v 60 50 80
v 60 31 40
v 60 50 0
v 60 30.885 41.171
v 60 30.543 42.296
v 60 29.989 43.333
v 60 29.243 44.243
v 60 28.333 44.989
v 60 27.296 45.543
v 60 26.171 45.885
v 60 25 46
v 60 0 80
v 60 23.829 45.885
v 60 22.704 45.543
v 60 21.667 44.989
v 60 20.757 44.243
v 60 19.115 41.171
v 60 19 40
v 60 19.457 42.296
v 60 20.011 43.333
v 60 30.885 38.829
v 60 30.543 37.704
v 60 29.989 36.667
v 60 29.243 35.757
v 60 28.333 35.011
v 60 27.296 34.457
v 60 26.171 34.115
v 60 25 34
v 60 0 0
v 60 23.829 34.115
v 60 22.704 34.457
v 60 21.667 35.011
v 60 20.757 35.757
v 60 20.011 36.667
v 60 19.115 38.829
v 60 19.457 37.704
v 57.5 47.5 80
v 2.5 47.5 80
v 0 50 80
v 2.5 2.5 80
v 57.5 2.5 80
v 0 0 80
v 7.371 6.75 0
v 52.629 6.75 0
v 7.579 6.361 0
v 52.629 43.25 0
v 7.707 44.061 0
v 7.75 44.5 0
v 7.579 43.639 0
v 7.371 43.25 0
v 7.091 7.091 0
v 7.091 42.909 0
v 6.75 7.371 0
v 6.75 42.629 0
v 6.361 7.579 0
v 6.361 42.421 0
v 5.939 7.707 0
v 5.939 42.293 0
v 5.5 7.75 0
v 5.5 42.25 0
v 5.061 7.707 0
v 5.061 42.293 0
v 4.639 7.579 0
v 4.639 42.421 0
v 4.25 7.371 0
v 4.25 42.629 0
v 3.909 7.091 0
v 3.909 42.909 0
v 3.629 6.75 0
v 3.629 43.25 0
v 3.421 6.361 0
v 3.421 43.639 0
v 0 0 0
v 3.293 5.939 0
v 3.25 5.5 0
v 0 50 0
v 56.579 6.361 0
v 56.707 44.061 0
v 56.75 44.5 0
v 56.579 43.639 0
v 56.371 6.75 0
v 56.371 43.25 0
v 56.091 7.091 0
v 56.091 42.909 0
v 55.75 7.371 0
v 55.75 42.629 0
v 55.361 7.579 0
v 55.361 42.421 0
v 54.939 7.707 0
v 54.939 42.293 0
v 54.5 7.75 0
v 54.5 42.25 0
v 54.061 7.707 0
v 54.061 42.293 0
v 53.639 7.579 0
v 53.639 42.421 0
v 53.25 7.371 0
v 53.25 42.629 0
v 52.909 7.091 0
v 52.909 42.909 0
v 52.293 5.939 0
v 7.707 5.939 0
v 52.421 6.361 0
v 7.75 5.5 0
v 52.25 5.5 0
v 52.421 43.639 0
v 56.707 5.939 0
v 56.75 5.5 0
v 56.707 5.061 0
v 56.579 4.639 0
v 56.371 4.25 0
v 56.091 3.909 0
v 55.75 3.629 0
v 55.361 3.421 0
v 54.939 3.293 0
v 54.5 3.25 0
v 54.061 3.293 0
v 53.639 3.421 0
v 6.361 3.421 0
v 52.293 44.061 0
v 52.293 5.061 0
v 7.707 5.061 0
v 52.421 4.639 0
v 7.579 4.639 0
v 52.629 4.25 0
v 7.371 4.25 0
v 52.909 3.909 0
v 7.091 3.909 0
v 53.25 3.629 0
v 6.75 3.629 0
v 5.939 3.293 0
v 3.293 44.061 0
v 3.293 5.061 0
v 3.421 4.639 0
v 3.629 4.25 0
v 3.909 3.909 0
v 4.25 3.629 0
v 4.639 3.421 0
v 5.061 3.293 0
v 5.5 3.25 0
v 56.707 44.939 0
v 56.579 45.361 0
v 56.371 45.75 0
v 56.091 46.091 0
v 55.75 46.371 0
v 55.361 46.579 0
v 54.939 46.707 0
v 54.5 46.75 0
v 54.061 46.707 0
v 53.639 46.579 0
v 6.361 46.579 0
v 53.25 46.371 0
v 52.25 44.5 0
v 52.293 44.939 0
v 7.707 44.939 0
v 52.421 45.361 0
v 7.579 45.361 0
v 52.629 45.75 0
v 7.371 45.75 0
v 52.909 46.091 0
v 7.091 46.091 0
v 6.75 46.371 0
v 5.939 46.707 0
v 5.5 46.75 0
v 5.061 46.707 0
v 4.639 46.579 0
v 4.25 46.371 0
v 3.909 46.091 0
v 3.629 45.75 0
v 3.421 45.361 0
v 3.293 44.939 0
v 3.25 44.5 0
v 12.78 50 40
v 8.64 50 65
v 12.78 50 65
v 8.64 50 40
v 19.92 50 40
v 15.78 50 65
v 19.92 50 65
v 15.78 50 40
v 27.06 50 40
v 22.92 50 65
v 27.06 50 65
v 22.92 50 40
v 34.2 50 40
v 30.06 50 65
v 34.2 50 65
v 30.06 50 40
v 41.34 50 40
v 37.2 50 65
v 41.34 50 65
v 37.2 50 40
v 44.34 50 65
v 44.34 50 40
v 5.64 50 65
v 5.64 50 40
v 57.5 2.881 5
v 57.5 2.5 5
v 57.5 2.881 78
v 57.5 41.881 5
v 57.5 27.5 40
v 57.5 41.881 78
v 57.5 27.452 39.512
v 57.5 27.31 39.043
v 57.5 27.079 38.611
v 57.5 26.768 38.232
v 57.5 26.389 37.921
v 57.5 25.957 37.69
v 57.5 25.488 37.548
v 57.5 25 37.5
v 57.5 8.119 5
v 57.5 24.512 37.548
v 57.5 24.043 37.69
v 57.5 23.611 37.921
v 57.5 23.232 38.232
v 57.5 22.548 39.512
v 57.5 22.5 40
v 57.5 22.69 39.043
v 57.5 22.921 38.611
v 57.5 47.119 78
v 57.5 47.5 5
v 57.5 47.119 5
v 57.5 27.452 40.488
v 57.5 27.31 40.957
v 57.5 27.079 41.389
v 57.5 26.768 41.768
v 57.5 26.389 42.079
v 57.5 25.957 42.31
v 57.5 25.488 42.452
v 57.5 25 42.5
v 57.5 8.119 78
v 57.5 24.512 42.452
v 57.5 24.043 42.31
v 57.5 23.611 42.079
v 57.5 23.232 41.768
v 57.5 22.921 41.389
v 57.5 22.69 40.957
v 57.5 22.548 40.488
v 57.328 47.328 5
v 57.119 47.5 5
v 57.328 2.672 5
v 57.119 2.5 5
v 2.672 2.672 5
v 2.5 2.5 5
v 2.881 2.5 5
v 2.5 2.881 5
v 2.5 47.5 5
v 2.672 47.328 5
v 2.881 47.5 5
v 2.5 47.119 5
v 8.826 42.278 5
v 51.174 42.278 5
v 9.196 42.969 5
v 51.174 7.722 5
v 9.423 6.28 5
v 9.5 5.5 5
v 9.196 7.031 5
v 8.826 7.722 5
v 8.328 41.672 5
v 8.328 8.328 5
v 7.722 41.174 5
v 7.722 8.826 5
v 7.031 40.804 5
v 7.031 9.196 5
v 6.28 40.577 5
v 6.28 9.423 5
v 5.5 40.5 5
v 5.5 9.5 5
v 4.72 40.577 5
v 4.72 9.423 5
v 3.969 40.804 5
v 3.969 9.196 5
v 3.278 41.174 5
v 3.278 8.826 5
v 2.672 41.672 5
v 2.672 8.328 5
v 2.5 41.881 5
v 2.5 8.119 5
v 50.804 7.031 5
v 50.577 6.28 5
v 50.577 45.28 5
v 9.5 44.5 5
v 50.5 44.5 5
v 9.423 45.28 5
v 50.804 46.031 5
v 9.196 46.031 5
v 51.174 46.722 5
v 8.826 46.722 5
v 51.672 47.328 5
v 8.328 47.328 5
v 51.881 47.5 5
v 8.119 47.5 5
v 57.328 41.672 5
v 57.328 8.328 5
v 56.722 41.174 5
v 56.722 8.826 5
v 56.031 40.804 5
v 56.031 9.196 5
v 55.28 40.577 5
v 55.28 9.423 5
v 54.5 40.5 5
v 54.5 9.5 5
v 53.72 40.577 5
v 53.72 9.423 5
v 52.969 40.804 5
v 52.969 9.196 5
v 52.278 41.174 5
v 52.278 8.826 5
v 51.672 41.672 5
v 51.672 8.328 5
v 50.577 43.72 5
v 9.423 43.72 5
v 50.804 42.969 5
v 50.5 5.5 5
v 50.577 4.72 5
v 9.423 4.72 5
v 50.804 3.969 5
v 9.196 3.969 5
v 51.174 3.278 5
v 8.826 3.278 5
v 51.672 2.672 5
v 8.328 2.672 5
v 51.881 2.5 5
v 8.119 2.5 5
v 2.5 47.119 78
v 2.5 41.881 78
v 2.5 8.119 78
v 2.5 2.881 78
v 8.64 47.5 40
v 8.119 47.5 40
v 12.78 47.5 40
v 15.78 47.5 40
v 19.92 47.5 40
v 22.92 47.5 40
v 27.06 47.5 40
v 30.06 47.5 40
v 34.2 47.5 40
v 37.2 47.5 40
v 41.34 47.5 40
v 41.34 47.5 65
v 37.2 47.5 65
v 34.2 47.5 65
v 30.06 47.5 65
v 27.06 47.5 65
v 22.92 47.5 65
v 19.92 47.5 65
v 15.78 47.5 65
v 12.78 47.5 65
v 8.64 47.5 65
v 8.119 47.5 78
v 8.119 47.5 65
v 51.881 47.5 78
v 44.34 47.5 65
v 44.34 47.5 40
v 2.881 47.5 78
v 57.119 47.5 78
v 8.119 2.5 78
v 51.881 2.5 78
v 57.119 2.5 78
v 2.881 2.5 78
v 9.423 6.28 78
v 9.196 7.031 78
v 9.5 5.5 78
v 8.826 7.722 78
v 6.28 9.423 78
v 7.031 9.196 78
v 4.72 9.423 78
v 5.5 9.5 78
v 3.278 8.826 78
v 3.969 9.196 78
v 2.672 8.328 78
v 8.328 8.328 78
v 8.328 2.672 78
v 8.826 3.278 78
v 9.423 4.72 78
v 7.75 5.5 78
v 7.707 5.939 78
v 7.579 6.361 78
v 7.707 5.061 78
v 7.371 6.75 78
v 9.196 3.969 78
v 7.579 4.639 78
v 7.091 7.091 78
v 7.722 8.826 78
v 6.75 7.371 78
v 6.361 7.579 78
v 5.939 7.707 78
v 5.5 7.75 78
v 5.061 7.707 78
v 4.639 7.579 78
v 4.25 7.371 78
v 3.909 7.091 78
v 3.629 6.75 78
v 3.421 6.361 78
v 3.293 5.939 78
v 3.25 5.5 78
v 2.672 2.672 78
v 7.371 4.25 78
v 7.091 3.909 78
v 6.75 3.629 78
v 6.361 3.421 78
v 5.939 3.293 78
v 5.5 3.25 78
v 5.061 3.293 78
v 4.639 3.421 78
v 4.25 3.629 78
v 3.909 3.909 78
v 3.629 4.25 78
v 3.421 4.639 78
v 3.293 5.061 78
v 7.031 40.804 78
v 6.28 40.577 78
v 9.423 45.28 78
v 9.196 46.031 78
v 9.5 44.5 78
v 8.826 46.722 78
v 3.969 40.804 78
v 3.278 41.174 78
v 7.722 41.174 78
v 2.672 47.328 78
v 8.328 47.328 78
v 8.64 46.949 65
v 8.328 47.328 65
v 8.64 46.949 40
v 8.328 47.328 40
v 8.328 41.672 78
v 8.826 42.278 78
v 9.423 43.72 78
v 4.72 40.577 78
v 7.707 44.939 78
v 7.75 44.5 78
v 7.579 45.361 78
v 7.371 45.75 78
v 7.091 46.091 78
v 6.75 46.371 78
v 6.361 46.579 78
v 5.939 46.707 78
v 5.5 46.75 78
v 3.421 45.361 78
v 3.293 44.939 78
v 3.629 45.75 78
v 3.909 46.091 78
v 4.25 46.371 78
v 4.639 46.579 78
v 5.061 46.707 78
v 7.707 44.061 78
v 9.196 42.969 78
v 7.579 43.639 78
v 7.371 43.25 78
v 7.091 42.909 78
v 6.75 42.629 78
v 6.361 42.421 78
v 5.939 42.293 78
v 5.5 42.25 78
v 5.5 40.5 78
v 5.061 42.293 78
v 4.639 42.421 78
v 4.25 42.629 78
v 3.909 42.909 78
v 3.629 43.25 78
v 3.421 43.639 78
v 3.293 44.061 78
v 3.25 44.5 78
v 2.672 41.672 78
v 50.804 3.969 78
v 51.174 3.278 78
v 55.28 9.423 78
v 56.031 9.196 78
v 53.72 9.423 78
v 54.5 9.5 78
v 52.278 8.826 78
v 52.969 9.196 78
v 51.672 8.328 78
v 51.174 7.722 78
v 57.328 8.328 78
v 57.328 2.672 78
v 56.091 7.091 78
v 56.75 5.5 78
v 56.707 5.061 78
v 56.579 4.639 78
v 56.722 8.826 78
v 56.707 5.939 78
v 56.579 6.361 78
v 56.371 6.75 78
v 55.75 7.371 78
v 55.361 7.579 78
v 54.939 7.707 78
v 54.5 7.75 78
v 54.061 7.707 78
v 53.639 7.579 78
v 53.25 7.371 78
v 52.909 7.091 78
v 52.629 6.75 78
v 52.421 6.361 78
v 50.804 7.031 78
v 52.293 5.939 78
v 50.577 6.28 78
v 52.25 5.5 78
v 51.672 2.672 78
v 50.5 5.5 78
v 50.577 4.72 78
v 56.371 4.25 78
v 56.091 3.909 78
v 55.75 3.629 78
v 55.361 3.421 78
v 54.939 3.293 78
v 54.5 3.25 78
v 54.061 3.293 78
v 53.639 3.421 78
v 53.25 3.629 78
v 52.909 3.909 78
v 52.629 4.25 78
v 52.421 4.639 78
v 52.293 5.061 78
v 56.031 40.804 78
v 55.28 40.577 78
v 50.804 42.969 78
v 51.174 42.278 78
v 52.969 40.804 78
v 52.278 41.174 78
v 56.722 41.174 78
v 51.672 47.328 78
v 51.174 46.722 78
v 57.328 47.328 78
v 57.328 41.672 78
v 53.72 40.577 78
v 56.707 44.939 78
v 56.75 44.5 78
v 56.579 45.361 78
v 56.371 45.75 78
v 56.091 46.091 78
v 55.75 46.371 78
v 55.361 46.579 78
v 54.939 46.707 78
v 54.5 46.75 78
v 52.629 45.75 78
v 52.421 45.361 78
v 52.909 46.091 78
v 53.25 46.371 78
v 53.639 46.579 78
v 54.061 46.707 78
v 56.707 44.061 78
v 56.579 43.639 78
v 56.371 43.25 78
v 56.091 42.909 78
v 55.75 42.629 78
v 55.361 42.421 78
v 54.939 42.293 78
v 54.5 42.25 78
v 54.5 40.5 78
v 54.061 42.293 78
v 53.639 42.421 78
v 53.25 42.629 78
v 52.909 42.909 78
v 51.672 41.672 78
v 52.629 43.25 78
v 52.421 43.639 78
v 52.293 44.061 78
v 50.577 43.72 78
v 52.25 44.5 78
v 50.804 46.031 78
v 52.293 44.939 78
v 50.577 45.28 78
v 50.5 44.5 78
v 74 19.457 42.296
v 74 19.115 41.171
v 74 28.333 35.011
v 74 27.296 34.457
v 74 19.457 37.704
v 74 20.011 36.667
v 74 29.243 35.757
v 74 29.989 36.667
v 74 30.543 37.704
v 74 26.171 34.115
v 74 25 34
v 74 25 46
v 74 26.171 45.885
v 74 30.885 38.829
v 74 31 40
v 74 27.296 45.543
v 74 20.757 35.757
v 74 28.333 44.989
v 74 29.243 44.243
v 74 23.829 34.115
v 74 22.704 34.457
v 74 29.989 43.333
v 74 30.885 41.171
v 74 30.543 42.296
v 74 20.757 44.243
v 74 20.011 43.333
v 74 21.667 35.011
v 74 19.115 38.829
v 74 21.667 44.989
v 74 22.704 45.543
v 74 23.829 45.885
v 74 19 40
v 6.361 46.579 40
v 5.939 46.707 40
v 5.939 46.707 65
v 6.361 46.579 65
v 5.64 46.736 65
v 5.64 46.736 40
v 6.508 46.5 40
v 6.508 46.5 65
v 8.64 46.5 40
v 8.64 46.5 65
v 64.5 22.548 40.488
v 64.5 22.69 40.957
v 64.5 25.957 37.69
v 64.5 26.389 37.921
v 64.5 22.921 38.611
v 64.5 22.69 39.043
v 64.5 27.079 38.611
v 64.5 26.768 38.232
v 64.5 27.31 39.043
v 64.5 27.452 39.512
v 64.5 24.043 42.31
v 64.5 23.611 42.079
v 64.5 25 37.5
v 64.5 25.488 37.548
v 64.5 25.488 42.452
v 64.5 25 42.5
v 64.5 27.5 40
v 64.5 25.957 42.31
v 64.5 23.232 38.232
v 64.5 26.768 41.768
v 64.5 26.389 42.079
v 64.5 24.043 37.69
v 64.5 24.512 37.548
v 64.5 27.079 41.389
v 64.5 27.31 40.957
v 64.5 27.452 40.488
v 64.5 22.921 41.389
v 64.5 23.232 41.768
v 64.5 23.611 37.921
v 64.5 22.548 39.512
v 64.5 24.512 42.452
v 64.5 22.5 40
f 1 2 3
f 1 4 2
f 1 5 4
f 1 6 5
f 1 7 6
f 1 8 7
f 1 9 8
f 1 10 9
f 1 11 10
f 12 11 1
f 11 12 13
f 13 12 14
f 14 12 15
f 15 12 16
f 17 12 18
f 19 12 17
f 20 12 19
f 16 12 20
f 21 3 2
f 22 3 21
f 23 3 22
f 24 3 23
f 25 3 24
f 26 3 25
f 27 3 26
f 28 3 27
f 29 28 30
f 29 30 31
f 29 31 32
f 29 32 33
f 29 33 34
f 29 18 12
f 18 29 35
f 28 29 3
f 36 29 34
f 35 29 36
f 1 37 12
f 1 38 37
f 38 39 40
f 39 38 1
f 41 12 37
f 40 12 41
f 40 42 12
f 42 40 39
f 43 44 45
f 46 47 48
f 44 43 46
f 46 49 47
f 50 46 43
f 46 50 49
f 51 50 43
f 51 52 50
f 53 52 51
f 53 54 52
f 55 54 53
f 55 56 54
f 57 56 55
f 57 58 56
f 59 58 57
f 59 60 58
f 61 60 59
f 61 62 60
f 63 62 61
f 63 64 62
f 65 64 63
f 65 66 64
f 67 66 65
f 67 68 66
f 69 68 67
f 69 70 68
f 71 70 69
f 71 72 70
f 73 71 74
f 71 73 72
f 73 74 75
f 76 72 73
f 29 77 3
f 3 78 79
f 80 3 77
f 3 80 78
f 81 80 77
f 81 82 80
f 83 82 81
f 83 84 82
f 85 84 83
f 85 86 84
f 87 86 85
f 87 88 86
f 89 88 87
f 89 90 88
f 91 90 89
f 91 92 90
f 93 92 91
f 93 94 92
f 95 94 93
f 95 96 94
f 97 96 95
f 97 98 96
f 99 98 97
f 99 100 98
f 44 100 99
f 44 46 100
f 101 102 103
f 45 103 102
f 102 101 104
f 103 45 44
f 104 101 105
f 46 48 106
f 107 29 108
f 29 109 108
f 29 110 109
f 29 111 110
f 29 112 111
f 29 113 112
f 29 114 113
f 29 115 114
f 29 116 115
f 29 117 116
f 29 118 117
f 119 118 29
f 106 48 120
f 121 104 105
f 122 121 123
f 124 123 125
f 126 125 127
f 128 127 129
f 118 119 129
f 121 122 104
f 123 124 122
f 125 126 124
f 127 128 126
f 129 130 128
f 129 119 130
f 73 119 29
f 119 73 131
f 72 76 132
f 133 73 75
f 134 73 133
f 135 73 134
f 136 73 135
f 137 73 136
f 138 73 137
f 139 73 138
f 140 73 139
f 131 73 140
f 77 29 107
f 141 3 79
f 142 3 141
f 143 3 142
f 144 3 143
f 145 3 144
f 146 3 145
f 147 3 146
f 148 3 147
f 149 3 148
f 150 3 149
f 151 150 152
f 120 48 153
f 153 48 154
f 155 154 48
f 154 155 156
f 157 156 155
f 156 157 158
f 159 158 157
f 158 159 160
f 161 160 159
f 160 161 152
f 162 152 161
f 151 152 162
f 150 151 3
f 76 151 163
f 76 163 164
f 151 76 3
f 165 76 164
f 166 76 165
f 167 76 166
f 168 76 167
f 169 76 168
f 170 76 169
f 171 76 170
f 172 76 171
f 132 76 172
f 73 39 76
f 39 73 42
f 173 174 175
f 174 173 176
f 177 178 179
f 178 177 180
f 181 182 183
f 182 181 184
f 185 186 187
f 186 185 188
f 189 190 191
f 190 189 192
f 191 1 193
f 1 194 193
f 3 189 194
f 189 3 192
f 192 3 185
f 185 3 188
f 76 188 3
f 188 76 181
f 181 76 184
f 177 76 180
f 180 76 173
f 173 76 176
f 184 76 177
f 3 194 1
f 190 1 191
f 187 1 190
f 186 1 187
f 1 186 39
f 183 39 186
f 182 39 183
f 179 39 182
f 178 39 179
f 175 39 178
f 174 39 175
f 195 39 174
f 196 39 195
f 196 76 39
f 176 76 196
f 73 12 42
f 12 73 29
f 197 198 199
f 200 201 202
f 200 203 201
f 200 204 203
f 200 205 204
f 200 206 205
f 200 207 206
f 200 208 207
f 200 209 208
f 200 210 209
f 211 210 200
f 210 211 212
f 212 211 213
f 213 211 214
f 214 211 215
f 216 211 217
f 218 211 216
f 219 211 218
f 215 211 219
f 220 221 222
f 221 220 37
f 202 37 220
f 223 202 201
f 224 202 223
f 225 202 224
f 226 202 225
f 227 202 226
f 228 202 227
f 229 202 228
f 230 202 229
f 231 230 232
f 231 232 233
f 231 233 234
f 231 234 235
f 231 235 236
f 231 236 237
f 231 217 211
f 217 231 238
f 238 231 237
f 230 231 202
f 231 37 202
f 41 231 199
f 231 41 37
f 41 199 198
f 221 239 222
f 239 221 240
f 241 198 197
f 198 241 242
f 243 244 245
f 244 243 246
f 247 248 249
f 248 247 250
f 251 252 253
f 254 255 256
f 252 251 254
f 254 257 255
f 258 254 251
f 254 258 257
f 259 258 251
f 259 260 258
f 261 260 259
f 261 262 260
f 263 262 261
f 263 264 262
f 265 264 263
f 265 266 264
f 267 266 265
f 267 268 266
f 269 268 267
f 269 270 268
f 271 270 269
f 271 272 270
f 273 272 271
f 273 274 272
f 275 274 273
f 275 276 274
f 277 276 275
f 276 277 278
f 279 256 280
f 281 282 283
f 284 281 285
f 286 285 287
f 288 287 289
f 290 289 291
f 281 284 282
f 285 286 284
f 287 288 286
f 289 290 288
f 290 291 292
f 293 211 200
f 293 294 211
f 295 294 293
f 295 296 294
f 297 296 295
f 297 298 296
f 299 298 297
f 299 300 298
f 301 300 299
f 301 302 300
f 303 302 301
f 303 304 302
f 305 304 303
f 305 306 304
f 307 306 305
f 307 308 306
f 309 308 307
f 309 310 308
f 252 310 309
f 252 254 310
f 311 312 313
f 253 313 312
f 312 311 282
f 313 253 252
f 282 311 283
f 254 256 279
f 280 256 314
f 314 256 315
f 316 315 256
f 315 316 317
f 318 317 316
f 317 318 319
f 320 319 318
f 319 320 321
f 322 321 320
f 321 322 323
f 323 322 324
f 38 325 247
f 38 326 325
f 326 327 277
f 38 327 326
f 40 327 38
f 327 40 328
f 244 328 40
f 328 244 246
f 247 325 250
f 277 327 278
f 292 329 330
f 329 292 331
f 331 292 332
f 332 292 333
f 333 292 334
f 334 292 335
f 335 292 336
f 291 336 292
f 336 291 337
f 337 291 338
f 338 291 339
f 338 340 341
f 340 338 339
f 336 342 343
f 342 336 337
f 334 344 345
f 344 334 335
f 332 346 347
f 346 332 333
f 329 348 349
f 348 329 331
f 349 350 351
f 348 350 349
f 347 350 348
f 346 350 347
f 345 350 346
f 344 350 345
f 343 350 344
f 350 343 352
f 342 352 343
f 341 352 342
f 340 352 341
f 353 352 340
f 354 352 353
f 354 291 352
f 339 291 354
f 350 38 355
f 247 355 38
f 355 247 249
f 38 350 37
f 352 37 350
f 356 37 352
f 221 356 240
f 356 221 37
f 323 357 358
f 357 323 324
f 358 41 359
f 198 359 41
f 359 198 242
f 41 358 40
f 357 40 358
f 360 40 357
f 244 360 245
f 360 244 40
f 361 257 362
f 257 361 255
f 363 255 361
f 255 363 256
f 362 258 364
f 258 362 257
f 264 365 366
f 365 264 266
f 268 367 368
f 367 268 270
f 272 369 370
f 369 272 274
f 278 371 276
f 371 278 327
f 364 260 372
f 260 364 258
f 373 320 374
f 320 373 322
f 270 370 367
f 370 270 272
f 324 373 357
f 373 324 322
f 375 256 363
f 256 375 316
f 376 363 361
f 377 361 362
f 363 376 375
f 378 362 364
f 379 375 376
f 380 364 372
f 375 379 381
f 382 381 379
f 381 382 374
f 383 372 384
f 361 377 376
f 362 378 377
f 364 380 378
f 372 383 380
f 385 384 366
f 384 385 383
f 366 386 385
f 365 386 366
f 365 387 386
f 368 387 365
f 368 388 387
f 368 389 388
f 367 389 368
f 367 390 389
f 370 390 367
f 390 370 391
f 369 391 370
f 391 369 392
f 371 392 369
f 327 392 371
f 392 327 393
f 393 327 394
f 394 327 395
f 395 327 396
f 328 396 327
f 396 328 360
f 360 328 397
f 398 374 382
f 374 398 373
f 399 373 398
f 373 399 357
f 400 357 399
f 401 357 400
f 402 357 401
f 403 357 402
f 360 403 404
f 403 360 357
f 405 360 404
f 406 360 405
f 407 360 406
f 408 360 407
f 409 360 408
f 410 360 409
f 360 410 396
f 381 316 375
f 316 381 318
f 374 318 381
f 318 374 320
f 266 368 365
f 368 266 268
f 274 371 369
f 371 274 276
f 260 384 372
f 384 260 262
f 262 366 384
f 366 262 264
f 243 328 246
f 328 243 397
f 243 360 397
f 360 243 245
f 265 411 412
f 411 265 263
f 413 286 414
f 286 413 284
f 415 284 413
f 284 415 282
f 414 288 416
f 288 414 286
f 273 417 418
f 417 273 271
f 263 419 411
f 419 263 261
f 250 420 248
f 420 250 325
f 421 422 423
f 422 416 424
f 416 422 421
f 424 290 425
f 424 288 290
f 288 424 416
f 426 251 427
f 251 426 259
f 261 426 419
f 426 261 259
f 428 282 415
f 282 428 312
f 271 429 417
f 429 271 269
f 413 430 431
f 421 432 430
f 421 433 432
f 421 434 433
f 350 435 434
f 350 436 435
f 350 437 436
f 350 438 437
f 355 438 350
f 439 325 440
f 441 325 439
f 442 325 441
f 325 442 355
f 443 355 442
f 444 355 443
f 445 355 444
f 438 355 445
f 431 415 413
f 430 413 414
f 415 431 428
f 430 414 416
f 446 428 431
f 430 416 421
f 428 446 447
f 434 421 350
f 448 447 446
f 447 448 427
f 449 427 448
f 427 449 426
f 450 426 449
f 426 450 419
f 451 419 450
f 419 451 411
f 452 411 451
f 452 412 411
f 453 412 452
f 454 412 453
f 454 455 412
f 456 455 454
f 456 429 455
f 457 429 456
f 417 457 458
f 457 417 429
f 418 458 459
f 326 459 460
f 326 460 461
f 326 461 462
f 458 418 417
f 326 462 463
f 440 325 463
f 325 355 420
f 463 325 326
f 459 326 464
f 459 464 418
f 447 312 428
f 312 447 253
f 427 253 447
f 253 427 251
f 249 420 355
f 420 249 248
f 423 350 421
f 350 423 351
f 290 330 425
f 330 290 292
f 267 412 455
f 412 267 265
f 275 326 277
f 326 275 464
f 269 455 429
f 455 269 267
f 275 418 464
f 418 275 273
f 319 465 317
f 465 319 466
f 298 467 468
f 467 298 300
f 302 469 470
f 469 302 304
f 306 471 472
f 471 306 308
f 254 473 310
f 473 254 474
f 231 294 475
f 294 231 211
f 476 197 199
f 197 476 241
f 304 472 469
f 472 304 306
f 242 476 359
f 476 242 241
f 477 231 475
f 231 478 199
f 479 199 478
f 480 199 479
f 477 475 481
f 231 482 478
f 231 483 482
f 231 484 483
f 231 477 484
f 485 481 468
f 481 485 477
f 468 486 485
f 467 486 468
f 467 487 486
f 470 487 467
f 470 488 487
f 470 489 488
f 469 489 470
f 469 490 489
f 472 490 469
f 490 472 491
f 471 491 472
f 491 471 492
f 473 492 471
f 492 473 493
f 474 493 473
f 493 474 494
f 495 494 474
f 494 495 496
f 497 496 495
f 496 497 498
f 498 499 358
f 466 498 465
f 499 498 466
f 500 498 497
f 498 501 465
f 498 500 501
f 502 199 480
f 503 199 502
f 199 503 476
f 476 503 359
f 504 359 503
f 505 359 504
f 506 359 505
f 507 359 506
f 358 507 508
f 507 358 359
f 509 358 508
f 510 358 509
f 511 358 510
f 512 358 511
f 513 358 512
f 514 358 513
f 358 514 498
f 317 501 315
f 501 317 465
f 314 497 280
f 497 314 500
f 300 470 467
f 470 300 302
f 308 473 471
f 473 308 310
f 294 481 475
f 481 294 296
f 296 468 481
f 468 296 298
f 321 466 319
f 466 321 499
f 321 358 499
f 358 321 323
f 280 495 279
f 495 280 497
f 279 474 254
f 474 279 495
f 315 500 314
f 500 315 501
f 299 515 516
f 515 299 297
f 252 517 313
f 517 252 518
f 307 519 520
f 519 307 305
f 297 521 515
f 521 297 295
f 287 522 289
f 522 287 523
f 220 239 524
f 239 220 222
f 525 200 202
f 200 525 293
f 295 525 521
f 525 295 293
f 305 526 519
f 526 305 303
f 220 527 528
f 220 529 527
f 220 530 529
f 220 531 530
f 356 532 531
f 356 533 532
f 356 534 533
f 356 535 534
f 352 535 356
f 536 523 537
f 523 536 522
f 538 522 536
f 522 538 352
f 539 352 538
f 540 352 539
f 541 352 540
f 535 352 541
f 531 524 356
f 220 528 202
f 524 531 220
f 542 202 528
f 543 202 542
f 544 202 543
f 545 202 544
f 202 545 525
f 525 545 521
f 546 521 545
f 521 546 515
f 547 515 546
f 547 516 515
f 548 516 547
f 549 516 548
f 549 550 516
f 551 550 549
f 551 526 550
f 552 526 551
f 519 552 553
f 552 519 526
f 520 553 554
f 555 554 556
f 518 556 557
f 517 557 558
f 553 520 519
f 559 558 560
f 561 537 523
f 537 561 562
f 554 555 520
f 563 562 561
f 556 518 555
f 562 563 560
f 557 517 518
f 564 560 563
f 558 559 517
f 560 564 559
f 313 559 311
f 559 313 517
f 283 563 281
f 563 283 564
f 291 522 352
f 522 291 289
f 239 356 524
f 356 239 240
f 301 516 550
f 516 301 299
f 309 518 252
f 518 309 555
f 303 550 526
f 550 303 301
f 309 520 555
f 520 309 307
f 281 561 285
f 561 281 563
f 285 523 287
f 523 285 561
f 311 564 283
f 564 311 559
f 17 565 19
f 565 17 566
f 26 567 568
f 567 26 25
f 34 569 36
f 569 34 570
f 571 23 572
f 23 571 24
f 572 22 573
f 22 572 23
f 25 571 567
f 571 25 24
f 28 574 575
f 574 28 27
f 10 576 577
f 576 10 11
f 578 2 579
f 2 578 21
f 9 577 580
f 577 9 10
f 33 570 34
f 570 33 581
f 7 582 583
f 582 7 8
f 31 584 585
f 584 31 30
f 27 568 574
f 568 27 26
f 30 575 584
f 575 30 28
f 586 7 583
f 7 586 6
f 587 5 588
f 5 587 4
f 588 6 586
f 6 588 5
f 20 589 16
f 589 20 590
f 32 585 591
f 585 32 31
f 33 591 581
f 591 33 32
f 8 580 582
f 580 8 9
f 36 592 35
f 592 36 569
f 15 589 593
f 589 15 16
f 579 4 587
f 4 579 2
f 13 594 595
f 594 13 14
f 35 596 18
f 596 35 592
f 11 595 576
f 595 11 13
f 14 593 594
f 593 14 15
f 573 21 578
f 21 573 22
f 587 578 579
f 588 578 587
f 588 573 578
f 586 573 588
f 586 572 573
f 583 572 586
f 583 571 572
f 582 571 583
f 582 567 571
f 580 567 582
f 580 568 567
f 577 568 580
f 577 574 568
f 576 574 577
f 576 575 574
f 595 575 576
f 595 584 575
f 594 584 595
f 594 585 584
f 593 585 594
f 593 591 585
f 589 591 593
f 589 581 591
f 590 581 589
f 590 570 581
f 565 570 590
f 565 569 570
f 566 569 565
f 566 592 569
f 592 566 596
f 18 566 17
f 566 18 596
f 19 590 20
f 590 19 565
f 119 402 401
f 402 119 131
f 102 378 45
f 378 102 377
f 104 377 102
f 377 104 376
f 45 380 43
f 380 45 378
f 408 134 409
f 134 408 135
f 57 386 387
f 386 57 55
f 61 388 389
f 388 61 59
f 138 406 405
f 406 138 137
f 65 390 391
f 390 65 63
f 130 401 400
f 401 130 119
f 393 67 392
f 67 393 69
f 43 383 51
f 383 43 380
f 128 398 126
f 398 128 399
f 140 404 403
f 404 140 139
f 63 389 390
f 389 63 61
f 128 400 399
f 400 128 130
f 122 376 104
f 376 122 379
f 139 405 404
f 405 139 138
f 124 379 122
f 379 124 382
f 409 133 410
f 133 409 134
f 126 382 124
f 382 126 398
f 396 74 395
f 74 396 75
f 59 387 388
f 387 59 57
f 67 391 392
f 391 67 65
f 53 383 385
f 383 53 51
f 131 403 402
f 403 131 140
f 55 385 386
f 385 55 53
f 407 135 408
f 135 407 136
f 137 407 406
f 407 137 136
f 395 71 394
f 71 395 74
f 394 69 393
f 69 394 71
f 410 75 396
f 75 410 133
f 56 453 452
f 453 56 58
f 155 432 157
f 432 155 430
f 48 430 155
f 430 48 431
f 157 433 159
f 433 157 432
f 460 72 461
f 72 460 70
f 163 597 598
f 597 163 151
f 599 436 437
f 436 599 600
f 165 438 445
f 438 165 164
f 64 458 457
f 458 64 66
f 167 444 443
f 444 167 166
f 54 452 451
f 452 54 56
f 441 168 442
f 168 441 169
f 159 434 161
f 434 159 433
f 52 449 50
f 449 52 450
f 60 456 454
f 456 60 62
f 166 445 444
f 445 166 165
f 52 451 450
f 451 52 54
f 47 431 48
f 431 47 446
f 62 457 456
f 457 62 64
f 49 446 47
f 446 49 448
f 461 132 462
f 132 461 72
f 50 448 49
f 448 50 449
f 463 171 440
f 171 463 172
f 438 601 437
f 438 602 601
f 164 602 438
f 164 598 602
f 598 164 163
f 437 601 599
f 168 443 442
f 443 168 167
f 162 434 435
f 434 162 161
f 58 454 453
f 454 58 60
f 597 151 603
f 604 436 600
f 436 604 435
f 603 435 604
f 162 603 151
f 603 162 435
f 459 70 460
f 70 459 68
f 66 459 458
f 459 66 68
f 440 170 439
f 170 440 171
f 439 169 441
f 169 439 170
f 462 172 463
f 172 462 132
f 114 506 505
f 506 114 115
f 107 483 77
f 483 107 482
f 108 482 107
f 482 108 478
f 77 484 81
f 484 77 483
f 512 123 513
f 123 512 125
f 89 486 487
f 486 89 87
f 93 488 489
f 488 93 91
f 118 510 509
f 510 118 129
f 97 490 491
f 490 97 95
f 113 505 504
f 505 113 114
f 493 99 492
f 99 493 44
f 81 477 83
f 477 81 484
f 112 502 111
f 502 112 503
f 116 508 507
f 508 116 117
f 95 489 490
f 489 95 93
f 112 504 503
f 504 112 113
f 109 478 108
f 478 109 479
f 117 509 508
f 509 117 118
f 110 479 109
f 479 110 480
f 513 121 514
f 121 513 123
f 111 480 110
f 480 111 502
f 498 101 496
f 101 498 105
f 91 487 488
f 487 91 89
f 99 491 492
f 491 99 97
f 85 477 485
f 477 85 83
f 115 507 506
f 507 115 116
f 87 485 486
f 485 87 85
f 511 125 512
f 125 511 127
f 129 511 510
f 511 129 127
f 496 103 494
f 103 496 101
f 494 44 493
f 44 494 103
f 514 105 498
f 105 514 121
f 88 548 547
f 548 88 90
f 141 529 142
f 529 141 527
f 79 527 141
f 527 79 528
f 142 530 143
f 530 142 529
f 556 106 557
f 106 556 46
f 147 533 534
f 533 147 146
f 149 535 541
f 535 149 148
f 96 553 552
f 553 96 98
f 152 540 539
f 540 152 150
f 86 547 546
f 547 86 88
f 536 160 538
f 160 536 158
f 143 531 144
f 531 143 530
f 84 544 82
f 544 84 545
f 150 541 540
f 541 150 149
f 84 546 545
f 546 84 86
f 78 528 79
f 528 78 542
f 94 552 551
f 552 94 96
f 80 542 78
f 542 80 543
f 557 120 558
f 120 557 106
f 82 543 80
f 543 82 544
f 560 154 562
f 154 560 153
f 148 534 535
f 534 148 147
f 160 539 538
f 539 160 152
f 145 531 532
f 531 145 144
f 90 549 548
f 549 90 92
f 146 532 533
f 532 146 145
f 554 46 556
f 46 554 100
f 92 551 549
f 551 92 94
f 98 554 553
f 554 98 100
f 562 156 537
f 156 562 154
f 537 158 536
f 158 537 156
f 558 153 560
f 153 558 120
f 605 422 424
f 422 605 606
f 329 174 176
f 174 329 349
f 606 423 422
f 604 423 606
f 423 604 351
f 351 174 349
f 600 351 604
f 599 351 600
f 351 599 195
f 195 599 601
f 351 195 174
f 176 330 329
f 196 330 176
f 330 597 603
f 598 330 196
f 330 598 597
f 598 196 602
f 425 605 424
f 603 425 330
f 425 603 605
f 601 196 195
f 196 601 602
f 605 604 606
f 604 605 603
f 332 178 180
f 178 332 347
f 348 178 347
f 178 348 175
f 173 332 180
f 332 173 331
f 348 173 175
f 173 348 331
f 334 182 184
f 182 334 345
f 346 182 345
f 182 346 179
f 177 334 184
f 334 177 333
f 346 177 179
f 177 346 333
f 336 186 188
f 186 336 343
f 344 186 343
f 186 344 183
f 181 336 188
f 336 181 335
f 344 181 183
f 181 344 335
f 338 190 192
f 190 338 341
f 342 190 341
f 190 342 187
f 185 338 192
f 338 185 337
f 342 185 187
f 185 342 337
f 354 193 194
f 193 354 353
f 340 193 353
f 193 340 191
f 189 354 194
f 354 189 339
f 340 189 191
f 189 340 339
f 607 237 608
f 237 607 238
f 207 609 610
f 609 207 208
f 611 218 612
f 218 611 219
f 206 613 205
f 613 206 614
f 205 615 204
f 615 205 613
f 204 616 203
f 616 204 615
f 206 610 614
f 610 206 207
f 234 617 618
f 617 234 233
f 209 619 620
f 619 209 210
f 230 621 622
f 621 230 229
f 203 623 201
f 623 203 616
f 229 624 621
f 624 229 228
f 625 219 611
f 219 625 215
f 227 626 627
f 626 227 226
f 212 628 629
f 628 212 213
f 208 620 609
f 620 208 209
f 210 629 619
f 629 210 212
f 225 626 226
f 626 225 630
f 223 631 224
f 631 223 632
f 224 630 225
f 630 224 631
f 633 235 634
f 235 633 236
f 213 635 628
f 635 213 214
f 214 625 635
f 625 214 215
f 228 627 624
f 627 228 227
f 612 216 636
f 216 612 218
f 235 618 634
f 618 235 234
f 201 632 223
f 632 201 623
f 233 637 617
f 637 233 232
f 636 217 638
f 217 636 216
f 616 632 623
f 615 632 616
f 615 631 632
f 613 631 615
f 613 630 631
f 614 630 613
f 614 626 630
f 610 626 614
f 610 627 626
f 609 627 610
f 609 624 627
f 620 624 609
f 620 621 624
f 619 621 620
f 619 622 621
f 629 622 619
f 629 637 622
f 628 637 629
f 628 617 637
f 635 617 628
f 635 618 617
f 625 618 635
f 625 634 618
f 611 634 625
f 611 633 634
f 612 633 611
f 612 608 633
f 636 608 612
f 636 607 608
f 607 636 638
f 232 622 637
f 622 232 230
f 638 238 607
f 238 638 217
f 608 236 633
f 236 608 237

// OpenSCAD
$fn = 32;

// ----------------------------------------------------------------------
// Enclosure body: 60 x 50 x 80 mm, wall 2.5 mm
// ----------------------------------------------------------------------

// --- parameters (mm) ---
length = 60;              // outside length, X
width = 50;               // outside width, Y
height = 80;              // outside height, Z
wall = 2.5;               // side wall thickness
floor_t = 5;              // floor thickness
boss_d = 8;               // corner boss diameter
boss_h = 73;              // corner boss height above the floor
boss_hole_d = 4.5;        // lid screw clearance in the boss
boss_lip = 5.5;           // boss centre inset from the corner
vent_slots = 6;           // vent slots in the long wall
vent_w = 3;               // vent slot width
vent_h = 25;              // vent slot height
vent_pitch = 7.14;        // vent slot pitch
vent_z = 40;              // vent slot sill height
nipple_d = 12;            // cable gland boss diameter
nipple_h = 14;            // cable gland boss height
nipple_bore = 5;          // cable gland bore

module shell() {
  difference() {
    cube([length, width, height]);
    /* hollow, open at the top */
    translate([wall, wall, floor_t])
      cube([length - 2 * wall, width - 2 * wall, height]);
  }
}

module bosses() {
  /* corner bosses, sunk 1 mm into the floor */
  for (sx = [0, 1]) for (sy = [0, 1])
    translate([sx * (length - 2 * boss_lip) + boss_lip, sy * (width - 2 * boss_lip) + boss_lip, floor_t - 1])
      cylinder(h = boss_h + 1, d = boss_d);
}

module gland() {
  /* boss on the short wall, sunk 1 mm into it */
  translate([length - 1, width / 2, height * 0.5]) rotate([0, 90, 0])
    cylinder(h = nipple_h + 1, d = nipple_d);
}

difference() {
  union() {
    shell();
    bosses();
    gland();
  }
  /* boss screw holes */
  for (sx = [0, 1]) for (sy = [0, 1])
    translate([sx * (length - 2 * boss_lip) + boss_lip, sy * (width - 2 * boss_lip) + boss_lip, -1]) cylinder(h = floor_t + boss_h + 2, d = boss_hole_d);
  /* vent grille in the +Y wall */
  for (i = [0 : vent_slots - 1]) translate([vent_pitch * (i + 1) - vent_w / 2, width - wall - 1, vent_z]) cube([vent_w, wall + 2, vent_h]);
  translate([length, width / 2, height * 0.5]) rotate([0, 90, 0]) translate([0, 0, -nipple_h - 2]) cylinder(h = nipple_h + wall + 4, d = nipple_bore);
}
